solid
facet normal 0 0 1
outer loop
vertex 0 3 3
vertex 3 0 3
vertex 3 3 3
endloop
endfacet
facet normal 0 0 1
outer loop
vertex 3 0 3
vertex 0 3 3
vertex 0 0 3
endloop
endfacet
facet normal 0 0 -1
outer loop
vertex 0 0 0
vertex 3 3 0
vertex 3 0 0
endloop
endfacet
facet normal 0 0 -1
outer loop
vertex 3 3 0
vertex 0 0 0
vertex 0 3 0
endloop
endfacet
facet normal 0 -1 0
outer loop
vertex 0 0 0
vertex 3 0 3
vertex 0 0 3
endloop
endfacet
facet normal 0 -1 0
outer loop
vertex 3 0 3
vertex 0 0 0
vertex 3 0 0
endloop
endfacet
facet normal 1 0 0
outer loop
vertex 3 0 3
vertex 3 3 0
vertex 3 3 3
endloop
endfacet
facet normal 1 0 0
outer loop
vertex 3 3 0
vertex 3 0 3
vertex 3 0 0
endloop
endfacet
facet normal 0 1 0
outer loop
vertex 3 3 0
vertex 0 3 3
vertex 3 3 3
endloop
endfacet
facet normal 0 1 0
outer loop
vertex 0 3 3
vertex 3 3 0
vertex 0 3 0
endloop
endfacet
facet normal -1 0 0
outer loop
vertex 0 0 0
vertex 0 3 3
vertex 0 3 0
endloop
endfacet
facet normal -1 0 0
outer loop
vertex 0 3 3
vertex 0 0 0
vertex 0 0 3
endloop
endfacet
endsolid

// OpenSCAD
a=12; // [1:3]

/*[Global] */

gloabal3=12; //[1:3]


/* [ ada d ] */
helo=12;

cube(3);
